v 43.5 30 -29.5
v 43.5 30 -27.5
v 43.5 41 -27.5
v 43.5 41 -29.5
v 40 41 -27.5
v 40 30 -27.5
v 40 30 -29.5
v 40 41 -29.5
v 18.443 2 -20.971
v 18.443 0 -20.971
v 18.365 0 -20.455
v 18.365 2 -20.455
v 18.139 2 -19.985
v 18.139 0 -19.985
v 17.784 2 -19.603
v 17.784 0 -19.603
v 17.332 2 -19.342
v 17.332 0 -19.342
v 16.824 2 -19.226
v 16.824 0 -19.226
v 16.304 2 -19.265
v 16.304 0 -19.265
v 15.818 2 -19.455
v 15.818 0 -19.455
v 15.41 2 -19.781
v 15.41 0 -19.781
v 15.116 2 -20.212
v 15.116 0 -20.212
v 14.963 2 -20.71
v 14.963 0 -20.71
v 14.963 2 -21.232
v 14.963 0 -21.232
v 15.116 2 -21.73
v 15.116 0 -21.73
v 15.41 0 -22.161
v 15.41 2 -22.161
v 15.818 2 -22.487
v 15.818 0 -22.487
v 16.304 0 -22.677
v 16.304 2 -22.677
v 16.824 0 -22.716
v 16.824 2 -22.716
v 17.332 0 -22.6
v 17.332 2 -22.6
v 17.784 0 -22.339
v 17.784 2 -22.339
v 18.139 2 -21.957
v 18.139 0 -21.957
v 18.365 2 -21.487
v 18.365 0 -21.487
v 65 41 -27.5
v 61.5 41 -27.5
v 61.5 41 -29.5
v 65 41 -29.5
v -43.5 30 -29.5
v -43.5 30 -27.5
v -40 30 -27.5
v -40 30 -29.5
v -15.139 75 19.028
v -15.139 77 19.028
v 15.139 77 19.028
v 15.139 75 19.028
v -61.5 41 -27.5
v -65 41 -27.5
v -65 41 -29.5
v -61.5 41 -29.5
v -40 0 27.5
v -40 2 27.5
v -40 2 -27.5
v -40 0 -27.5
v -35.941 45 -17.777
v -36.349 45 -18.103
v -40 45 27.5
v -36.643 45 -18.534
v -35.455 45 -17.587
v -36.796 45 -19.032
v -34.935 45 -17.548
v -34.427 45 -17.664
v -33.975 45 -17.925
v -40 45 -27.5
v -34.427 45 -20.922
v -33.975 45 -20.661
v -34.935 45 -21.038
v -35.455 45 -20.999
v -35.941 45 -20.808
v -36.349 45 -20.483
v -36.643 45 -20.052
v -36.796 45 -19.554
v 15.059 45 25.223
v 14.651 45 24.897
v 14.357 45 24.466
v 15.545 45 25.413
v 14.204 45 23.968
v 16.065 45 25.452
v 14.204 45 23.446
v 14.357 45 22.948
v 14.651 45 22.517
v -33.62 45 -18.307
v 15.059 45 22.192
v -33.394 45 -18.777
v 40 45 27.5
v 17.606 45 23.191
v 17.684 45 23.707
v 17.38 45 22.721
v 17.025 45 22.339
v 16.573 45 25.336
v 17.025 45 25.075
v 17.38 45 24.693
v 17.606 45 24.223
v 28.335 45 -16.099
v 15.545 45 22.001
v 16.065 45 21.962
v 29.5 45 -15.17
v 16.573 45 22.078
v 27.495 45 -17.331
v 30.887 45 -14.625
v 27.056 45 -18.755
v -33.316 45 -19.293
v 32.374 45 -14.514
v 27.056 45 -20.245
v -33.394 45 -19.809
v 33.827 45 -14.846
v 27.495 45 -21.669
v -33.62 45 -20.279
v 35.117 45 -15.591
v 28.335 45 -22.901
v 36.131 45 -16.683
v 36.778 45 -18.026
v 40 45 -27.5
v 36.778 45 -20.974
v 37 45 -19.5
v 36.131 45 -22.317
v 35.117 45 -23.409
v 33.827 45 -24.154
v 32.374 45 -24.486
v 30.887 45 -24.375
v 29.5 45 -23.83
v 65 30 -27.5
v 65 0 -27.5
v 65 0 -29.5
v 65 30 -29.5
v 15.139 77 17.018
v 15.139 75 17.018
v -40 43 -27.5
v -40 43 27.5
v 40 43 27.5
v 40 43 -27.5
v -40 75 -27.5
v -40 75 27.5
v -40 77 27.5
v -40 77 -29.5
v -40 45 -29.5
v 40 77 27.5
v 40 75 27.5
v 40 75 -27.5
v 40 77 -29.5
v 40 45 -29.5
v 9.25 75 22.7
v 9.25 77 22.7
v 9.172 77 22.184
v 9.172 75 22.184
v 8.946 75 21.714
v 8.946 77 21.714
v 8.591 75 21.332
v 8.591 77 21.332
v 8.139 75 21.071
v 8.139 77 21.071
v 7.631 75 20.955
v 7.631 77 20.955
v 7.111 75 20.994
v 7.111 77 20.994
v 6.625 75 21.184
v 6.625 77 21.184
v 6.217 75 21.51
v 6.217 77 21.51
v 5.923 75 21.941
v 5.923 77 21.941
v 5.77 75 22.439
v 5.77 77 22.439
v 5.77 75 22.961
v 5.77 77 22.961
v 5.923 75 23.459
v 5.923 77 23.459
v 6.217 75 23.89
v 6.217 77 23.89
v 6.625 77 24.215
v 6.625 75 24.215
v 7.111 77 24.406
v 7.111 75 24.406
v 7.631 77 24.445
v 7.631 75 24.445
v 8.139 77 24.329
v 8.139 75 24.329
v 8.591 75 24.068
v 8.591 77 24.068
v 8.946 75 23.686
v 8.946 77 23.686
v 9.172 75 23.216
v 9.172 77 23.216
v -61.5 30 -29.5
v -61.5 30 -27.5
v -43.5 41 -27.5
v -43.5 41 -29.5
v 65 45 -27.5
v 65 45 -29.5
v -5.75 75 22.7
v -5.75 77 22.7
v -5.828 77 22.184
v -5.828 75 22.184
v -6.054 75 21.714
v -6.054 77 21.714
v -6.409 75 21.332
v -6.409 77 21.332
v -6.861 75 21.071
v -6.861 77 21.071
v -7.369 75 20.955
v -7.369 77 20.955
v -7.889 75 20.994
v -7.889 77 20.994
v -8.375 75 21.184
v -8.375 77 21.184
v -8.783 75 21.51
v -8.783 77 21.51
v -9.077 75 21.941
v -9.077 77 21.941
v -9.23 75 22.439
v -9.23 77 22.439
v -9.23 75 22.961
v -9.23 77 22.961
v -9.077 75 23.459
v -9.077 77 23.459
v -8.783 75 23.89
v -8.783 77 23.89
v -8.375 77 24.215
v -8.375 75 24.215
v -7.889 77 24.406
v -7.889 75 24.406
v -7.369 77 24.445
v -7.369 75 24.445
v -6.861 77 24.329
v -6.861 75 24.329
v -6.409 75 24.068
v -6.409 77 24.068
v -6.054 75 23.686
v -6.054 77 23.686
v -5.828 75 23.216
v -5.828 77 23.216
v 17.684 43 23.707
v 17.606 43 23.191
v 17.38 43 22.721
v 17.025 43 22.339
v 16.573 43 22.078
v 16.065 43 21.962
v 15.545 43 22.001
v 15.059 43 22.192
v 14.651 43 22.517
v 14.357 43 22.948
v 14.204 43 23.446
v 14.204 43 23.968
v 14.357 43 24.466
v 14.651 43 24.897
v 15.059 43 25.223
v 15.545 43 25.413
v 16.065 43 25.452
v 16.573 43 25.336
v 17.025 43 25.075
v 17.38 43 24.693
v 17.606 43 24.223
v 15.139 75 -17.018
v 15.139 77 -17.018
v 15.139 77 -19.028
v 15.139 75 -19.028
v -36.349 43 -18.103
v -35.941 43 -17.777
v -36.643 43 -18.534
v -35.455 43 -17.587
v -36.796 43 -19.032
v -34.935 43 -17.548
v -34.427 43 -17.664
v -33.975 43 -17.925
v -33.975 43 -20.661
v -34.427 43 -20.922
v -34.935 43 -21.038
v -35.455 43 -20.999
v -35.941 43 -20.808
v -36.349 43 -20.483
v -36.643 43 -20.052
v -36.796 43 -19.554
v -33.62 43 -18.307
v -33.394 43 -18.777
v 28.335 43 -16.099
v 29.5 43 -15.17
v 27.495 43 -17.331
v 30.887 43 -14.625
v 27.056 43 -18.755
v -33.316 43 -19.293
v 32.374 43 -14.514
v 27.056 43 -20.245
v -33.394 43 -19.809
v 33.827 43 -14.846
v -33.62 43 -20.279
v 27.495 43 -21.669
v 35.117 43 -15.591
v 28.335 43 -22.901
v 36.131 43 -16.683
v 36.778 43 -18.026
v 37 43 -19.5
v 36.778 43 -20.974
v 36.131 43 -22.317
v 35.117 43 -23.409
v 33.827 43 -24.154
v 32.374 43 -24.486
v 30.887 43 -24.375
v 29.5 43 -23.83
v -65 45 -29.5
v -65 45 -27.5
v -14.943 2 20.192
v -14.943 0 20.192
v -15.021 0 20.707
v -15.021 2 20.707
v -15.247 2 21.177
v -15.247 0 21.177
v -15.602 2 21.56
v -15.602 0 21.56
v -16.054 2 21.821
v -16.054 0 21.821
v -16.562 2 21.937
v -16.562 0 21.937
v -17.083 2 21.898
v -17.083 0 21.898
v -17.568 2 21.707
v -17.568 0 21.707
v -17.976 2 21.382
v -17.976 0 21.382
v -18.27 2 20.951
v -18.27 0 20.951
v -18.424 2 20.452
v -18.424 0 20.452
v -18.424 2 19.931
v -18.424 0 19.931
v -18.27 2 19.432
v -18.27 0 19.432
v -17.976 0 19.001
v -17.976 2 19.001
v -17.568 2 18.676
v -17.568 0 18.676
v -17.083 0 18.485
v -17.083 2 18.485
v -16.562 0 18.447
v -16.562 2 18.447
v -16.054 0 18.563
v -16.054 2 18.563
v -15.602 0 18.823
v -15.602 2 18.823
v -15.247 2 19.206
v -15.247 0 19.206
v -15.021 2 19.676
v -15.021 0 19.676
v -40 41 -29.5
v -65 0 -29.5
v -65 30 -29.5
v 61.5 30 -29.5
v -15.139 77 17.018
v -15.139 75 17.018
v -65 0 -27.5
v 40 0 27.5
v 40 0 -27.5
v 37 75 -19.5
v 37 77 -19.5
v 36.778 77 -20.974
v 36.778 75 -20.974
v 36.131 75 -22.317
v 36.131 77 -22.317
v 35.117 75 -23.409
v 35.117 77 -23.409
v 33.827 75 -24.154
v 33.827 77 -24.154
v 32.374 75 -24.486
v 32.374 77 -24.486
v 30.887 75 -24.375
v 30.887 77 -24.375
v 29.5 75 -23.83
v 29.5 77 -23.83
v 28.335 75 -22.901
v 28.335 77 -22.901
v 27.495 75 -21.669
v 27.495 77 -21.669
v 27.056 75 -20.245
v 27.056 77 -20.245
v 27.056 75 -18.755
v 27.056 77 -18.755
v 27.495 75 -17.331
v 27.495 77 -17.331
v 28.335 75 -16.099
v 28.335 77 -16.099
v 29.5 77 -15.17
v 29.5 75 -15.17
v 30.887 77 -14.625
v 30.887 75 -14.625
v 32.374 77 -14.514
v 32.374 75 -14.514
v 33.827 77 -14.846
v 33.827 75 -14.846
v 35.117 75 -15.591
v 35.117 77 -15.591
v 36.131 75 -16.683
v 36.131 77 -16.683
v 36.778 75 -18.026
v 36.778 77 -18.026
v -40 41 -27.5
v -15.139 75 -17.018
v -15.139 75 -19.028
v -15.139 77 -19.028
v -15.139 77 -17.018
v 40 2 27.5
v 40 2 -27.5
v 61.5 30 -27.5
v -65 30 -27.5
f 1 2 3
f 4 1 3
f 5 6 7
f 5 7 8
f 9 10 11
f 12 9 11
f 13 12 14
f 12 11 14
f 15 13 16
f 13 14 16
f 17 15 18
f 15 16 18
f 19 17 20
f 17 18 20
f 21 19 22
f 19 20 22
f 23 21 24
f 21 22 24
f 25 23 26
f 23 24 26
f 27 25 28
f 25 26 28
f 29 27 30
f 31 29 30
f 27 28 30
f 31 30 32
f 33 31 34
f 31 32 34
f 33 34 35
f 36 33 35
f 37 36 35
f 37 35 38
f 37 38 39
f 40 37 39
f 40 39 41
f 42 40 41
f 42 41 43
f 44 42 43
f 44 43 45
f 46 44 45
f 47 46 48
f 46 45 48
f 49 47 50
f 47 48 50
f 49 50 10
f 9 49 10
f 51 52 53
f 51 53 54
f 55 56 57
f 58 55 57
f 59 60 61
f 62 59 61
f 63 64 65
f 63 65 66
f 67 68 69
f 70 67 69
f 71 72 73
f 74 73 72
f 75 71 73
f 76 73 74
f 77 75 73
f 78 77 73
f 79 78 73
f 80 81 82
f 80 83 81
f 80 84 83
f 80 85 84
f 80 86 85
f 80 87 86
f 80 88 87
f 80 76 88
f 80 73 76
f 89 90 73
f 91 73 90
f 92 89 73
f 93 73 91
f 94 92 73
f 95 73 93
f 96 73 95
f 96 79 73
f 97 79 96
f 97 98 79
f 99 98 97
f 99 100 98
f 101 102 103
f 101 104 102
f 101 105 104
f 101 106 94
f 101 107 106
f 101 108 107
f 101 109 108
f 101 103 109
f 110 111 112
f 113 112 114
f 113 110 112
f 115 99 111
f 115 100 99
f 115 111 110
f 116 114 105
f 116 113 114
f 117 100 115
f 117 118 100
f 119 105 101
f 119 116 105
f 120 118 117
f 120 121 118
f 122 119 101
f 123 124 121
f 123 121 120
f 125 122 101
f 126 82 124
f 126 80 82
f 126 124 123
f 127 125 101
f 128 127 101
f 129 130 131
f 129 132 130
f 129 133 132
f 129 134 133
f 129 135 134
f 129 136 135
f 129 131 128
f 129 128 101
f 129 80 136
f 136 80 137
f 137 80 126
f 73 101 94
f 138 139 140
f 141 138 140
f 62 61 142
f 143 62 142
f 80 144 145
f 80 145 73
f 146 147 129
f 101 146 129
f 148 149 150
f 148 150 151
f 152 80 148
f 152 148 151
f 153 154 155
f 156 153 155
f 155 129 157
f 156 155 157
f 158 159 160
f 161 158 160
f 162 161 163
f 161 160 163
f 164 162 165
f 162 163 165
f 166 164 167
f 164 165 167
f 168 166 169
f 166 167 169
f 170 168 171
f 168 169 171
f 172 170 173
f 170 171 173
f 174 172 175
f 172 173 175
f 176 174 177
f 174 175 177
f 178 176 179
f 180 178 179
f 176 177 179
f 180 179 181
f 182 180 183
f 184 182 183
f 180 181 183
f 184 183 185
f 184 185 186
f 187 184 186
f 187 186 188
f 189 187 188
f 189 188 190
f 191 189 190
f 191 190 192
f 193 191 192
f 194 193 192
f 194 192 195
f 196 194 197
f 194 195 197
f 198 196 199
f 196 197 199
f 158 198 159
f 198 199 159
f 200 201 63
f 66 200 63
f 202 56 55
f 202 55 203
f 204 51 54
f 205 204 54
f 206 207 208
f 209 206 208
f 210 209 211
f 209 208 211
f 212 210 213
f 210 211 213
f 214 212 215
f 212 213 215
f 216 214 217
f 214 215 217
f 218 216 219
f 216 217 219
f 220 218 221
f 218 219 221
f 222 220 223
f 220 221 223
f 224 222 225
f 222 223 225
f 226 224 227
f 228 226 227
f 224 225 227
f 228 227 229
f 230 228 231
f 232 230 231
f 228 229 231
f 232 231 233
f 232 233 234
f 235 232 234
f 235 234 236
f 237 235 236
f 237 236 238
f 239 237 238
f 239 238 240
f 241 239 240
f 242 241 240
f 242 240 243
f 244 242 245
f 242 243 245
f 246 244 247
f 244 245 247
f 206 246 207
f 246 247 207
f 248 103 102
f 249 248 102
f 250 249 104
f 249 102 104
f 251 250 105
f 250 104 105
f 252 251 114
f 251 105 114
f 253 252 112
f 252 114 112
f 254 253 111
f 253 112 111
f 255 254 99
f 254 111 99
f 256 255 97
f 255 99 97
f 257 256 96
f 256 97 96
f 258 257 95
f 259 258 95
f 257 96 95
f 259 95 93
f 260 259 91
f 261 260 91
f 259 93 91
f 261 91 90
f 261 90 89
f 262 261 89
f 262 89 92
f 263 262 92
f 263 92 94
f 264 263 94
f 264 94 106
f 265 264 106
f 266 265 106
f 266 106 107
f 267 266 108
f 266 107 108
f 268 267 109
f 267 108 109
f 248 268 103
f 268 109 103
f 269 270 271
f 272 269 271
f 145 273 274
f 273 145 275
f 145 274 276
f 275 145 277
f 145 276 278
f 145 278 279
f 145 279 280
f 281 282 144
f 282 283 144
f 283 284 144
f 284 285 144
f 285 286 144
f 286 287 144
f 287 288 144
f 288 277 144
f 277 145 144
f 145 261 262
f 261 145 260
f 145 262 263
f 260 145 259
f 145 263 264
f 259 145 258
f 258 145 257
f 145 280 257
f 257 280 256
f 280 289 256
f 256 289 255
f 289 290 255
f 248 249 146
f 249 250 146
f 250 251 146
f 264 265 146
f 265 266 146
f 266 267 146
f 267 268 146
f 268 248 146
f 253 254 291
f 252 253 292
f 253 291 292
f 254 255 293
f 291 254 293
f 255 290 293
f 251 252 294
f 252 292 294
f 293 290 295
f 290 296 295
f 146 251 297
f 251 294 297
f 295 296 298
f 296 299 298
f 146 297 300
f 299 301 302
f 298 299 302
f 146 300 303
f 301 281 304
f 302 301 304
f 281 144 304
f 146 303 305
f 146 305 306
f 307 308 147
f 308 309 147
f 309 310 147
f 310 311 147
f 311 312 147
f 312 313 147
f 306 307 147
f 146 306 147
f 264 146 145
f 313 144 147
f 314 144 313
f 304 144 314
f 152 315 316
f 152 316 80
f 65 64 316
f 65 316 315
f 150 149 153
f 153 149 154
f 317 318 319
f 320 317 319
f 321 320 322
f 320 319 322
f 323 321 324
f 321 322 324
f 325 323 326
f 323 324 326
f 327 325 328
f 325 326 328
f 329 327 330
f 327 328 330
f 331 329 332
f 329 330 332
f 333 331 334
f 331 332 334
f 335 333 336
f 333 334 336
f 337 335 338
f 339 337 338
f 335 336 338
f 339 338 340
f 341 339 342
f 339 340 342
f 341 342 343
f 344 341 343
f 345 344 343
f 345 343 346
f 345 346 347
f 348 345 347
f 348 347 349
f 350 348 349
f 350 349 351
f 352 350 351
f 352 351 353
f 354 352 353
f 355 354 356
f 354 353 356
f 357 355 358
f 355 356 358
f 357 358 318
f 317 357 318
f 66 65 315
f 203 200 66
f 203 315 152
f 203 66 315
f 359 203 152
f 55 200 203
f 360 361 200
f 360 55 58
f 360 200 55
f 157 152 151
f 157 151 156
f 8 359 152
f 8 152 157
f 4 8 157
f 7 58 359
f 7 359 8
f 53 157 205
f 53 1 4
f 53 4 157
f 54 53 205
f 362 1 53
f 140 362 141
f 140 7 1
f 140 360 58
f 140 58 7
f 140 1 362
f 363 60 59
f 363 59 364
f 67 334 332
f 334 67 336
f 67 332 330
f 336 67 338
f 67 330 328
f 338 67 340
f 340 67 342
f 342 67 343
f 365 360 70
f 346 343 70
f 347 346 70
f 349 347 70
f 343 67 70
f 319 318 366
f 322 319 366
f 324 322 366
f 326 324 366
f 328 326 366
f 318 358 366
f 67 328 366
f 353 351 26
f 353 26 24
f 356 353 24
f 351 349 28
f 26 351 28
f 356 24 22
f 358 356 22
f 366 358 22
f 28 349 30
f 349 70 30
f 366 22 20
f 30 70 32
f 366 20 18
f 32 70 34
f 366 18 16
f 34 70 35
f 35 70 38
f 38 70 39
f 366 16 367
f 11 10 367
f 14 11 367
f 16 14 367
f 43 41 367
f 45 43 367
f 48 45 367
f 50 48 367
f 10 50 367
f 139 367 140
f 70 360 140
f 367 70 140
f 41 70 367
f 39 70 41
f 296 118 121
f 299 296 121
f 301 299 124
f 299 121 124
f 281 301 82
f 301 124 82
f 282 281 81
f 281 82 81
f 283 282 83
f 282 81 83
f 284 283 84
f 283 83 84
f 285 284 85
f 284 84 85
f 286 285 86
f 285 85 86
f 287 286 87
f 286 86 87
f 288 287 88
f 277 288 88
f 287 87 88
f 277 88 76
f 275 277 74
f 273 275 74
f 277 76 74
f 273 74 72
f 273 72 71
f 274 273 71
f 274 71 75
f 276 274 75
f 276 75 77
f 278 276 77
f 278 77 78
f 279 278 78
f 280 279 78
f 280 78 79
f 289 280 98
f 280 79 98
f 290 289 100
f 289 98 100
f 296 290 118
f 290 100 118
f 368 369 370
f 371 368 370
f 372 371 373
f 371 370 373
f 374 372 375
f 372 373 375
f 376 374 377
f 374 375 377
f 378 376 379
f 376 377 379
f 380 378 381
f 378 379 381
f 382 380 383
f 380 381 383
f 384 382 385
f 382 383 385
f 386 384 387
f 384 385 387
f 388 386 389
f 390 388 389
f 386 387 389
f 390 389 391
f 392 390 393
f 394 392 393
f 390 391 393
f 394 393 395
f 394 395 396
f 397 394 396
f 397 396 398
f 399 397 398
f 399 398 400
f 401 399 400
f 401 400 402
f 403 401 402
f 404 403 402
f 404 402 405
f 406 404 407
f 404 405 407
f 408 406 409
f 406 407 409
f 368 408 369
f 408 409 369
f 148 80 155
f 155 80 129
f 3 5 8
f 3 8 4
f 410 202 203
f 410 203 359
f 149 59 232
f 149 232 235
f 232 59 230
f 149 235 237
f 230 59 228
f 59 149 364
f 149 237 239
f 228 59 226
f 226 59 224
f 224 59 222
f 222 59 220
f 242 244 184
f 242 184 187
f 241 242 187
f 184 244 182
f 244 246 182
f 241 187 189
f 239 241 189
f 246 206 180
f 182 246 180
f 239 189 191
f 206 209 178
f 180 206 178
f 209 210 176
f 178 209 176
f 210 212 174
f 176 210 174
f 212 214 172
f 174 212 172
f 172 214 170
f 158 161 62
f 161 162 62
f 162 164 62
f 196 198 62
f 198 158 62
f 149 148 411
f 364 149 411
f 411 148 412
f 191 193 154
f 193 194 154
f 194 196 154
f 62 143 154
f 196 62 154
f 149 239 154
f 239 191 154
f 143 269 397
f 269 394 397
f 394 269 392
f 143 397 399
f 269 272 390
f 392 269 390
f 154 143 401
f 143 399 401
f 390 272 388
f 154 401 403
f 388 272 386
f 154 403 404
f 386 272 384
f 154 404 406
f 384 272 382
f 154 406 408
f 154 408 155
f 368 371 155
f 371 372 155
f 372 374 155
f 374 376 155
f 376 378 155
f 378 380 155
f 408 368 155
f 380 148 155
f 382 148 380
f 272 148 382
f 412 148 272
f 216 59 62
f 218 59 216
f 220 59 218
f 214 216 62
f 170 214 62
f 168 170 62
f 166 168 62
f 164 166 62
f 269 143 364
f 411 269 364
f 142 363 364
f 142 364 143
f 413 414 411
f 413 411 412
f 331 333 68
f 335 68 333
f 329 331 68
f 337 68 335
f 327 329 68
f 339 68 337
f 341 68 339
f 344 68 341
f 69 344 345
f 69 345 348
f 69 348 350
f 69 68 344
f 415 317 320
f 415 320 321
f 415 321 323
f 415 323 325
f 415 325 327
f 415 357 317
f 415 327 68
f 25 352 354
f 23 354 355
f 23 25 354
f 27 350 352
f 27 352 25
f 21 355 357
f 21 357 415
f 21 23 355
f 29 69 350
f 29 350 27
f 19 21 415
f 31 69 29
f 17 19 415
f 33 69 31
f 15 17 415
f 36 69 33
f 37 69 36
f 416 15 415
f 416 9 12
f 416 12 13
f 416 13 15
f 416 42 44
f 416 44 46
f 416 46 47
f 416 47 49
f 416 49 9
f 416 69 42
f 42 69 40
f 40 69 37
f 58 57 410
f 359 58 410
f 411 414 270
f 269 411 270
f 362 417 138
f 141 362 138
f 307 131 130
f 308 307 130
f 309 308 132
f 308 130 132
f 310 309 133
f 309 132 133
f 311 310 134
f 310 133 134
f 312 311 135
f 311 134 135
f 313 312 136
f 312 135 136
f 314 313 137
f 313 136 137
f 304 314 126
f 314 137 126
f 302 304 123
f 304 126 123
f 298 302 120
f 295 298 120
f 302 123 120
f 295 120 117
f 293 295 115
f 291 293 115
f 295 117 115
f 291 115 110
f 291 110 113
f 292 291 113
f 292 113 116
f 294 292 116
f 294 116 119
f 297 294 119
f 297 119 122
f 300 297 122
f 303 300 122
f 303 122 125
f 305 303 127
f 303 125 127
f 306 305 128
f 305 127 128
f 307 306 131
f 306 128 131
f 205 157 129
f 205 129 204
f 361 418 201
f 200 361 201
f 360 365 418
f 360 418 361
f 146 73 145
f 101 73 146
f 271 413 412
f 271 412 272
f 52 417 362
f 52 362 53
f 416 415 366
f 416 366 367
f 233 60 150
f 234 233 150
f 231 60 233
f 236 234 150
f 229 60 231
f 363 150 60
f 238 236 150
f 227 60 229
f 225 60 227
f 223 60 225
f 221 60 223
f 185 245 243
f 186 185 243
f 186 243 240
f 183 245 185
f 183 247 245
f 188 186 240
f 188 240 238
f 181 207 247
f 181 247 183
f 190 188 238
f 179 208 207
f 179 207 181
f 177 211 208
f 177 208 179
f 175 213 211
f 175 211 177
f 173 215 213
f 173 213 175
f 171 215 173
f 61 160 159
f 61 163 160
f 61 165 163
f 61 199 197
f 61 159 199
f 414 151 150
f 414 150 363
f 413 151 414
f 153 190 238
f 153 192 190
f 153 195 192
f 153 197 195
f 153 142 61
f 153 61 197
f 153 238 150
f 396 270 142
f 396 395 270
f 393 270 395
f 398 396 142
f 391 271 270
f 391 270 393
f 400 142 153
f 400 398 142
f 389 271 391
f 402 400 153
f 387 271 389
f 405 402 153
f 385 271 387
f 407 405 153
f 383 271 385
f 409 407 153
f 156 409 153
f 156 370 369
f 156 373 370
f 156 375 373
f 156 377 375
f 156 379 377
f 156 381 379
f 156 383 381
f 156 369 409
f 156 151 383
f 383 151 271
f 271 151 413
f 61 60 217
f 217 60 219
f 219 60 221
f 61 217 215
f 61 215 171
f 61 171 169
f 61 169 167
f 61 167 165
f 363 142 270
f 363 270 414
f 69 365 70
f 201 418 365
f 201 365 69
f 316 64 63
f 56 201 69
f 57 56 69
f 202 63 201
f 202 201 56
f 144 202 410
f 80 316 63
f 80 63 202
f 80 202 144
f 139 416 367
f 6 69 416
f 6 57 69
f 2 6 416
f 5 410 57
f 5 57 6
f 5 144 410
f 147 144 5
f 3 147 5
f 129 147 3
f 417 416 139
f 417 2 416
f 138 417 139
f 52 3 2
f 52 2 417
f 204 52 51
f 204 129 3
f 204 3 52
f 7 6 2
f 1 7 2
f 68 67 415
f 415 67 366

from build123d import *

# Parameters (mm, degrees)
SKETCH1_W           = 130
SKETCH1_H           = 55
BOSS_EXTRUDE1_DEPTH = 2
SKETCH2_W           = 130
SKETCH2_H           = 2
BOSS_EXTRUDE2_DEPTH = 45
SKETCH3_W           = 25
SKETCH3_H           = 55
CUT_EXTRUDE1_DEPTH  = 45
SKETCH4_W           = 3.5
SKETCH4_H           = 11
CUT_EXTRUDE2_DEPTH  = 2
SKETCH6_W           = 80
SKETCH6_H           = 2
BOSS_EXTRUDE3_DEPTH = 55
SKETCH7_R           = 1.75
SKETCH7_R_2         = 5
CUT_EXTRUDE3_DEPTH  = 2
SKETCH8_W           = 80
SKETCH8_H           = 2
BOSS_EXTRUDE4_DEPTH = 30
SKETCH9_W           = 80
SKETCH9_H           = 57
BOSS_EXTRUDE5_DEPTH = 2
SKETCH11_R          = 5
SKETCH11_R_2        = 1.75
SKETCH11_W          = 30.278017406
SKETCH11_H          = 2.009390924
CUT_EXTRUDE4_DEPTH  = 2
SKETCH12_R          = 1.75
CUT_EXTRUDE5_DEPTH  = 2


with BuildPart() as part:
    # Sketch1 → Boss-Extrude1 (new body)
    with BuildSketch(Plane(origin=(0, 0, 0), x_dir=(1, 0, 0), z_dir=(0, 1, 0))):
        Rectangle(SKETCH1_W, SKETCH1_H)
    extrude(amount=BOSS_EXTRUDE1_DEPTH)

    # Sketch2 → Boss-Extrude2 (add)
    with BuildSketch(Plane(origin=(0, 0, 0), x_dir=(1, 0, 0), z_dir=(0, 1, 0))):
        with Locations((0, 28.5)):
            Rectangle(SKETCH2_W, SKETCH2_H)
    extrude(amount=BOSS_EXTRUDE2_DEPTH)

    # Sketch3 → Cut-Extrude1 (cut)
    with BuildSketch(Plane(origin=(0, 2, 0), x_dir=(1, 0, 0), z_dir=(0, 1, 0))):
        with Locations((-52.5, 0)):
            Rectangle(SKETCH3_W, SKETCH3_H)
        with Locations((52.5, 0)):
            Rectangle(SKETCH3_W, SKETCH3_H)
    extrude(amount=-CUT_EXTRUDE1_DEPTH, mode=Mode.SUBTRACT)

    # Sketch4 → Cut-Extrude2 (cut)
    with BuildSketch(Plane.XY.offset(-27.5)):
        with Locations((-63.25, 35.5)):
            Rectangle(SKETCH4_W, SKETCH4_H)
        with Locations((-41.75, 35.5)):
            Rectangle(SKETCH4_W, SKETCH4_H)
        with Locations((41.75, 35.5)):
            Rectangle(SKETCH4_W, SKETCH4_H)
        with Locations((63.25, 35.5)):
            Rectangle(SKETCH4_W, SKETCH4_H)
    extrude(amount=-CUT_EXTRUDE2_DEPTH, mode=Mode.SUBTRACT)

    # Sketch6 → Boss-Extrude3 (add)
    with BuildSketch(Plane.XY.offset(-27.5)):
        with Locations((0, 44)):
            Rectangle(SKETCH6_W, SKETCH6_H)
    extrude(amount=BOSS_EXTRUDE3_DEPTH)

    # Sketch7 → Cut-Extrude3 (cut)
    with BuildSketch(Plane(origin=(0, 45, 0), x_dir=(1, 0, 0), z_dir=(0, 1, 0))):
        with Locations((-35.065858189, 19.292839325)):
            Circle(SKETCH7_R)
        with Locations((15.934141811, -23.707160675)):
            Circle(SKETCH7_R)
        with Locations((32, 19.5)):
            Circle(SKETCH7_R_2)
    extrude(amount=-CUT_EXTRUDE3_DEPTH, mode=Mode.SUBTRACT)

    # Sketch8 → Boss-Extrude4 (add)
    with BuildSketch(Plane(origin=(0, 45, 0), x_dir=(1, 0, 0), z_dir=(0, 1, 0))):
        with Locations((0, 28.5)):
            Rectangle(SKETCH8_W, SKETCH8_H)
    extrude(amount=BOSS_EXTRUDE4_DEPTH)

    # Sketch9 → Boss-Extrude5 (add)
    with BuildSketch(Plane(origin=(0, 75, 0), x_dir=(1, 0, 0), z_dir=(0, 1, 0))):
        with Locations((0, 1)):
            Rectangle(SKETCH9_W, SKETCH9_H)
    extrude(amount=BOSS_EXTRUDE5_DEPTH)

    # Sketch11 → Cut-Extrude4 (cut)
    with BuildSketch(Plane(origin=(0, 77, 0), x_dir=(1, 0, 0), z_dir=(0, 1, 0))):
        with Locations((32, 19.5)):
            Circle(SKETCH11_R)
        with Locations((-7.5, -22.699940475)):
            Circle(SKETCH11_R_2)
        with Locations((7.5, -22.699940475)):
            Circle(SKETCH11_R_2)
        with Locations((0, -18.023076891)):
            Rectangle(SKETCH11_W, SKETCH11_H)
        with Locations((0, 18.023076891)):
            Rectangle(SKETCH11_W, SKETCH11_H)
    extrude(amount=-CUT_EXTRUDE4_DEPTH, mode=Mode.SUBTRACT)

    # Sketch12 → Cut-Extrude5 (cut)
    with BuildSketch(Plane.XZ):
        with Locations((-16.693132279, 20.191612333)):
            Circle(SKETCH12_R)
        with Locations((16.693132279, -20.97095973)):
            Circle(SKETCH12_R)
    extrude(amount=-CUT_EXTRUDE5_DEPTH, mode=Mode.SUBTRACT)


solid = part.part
